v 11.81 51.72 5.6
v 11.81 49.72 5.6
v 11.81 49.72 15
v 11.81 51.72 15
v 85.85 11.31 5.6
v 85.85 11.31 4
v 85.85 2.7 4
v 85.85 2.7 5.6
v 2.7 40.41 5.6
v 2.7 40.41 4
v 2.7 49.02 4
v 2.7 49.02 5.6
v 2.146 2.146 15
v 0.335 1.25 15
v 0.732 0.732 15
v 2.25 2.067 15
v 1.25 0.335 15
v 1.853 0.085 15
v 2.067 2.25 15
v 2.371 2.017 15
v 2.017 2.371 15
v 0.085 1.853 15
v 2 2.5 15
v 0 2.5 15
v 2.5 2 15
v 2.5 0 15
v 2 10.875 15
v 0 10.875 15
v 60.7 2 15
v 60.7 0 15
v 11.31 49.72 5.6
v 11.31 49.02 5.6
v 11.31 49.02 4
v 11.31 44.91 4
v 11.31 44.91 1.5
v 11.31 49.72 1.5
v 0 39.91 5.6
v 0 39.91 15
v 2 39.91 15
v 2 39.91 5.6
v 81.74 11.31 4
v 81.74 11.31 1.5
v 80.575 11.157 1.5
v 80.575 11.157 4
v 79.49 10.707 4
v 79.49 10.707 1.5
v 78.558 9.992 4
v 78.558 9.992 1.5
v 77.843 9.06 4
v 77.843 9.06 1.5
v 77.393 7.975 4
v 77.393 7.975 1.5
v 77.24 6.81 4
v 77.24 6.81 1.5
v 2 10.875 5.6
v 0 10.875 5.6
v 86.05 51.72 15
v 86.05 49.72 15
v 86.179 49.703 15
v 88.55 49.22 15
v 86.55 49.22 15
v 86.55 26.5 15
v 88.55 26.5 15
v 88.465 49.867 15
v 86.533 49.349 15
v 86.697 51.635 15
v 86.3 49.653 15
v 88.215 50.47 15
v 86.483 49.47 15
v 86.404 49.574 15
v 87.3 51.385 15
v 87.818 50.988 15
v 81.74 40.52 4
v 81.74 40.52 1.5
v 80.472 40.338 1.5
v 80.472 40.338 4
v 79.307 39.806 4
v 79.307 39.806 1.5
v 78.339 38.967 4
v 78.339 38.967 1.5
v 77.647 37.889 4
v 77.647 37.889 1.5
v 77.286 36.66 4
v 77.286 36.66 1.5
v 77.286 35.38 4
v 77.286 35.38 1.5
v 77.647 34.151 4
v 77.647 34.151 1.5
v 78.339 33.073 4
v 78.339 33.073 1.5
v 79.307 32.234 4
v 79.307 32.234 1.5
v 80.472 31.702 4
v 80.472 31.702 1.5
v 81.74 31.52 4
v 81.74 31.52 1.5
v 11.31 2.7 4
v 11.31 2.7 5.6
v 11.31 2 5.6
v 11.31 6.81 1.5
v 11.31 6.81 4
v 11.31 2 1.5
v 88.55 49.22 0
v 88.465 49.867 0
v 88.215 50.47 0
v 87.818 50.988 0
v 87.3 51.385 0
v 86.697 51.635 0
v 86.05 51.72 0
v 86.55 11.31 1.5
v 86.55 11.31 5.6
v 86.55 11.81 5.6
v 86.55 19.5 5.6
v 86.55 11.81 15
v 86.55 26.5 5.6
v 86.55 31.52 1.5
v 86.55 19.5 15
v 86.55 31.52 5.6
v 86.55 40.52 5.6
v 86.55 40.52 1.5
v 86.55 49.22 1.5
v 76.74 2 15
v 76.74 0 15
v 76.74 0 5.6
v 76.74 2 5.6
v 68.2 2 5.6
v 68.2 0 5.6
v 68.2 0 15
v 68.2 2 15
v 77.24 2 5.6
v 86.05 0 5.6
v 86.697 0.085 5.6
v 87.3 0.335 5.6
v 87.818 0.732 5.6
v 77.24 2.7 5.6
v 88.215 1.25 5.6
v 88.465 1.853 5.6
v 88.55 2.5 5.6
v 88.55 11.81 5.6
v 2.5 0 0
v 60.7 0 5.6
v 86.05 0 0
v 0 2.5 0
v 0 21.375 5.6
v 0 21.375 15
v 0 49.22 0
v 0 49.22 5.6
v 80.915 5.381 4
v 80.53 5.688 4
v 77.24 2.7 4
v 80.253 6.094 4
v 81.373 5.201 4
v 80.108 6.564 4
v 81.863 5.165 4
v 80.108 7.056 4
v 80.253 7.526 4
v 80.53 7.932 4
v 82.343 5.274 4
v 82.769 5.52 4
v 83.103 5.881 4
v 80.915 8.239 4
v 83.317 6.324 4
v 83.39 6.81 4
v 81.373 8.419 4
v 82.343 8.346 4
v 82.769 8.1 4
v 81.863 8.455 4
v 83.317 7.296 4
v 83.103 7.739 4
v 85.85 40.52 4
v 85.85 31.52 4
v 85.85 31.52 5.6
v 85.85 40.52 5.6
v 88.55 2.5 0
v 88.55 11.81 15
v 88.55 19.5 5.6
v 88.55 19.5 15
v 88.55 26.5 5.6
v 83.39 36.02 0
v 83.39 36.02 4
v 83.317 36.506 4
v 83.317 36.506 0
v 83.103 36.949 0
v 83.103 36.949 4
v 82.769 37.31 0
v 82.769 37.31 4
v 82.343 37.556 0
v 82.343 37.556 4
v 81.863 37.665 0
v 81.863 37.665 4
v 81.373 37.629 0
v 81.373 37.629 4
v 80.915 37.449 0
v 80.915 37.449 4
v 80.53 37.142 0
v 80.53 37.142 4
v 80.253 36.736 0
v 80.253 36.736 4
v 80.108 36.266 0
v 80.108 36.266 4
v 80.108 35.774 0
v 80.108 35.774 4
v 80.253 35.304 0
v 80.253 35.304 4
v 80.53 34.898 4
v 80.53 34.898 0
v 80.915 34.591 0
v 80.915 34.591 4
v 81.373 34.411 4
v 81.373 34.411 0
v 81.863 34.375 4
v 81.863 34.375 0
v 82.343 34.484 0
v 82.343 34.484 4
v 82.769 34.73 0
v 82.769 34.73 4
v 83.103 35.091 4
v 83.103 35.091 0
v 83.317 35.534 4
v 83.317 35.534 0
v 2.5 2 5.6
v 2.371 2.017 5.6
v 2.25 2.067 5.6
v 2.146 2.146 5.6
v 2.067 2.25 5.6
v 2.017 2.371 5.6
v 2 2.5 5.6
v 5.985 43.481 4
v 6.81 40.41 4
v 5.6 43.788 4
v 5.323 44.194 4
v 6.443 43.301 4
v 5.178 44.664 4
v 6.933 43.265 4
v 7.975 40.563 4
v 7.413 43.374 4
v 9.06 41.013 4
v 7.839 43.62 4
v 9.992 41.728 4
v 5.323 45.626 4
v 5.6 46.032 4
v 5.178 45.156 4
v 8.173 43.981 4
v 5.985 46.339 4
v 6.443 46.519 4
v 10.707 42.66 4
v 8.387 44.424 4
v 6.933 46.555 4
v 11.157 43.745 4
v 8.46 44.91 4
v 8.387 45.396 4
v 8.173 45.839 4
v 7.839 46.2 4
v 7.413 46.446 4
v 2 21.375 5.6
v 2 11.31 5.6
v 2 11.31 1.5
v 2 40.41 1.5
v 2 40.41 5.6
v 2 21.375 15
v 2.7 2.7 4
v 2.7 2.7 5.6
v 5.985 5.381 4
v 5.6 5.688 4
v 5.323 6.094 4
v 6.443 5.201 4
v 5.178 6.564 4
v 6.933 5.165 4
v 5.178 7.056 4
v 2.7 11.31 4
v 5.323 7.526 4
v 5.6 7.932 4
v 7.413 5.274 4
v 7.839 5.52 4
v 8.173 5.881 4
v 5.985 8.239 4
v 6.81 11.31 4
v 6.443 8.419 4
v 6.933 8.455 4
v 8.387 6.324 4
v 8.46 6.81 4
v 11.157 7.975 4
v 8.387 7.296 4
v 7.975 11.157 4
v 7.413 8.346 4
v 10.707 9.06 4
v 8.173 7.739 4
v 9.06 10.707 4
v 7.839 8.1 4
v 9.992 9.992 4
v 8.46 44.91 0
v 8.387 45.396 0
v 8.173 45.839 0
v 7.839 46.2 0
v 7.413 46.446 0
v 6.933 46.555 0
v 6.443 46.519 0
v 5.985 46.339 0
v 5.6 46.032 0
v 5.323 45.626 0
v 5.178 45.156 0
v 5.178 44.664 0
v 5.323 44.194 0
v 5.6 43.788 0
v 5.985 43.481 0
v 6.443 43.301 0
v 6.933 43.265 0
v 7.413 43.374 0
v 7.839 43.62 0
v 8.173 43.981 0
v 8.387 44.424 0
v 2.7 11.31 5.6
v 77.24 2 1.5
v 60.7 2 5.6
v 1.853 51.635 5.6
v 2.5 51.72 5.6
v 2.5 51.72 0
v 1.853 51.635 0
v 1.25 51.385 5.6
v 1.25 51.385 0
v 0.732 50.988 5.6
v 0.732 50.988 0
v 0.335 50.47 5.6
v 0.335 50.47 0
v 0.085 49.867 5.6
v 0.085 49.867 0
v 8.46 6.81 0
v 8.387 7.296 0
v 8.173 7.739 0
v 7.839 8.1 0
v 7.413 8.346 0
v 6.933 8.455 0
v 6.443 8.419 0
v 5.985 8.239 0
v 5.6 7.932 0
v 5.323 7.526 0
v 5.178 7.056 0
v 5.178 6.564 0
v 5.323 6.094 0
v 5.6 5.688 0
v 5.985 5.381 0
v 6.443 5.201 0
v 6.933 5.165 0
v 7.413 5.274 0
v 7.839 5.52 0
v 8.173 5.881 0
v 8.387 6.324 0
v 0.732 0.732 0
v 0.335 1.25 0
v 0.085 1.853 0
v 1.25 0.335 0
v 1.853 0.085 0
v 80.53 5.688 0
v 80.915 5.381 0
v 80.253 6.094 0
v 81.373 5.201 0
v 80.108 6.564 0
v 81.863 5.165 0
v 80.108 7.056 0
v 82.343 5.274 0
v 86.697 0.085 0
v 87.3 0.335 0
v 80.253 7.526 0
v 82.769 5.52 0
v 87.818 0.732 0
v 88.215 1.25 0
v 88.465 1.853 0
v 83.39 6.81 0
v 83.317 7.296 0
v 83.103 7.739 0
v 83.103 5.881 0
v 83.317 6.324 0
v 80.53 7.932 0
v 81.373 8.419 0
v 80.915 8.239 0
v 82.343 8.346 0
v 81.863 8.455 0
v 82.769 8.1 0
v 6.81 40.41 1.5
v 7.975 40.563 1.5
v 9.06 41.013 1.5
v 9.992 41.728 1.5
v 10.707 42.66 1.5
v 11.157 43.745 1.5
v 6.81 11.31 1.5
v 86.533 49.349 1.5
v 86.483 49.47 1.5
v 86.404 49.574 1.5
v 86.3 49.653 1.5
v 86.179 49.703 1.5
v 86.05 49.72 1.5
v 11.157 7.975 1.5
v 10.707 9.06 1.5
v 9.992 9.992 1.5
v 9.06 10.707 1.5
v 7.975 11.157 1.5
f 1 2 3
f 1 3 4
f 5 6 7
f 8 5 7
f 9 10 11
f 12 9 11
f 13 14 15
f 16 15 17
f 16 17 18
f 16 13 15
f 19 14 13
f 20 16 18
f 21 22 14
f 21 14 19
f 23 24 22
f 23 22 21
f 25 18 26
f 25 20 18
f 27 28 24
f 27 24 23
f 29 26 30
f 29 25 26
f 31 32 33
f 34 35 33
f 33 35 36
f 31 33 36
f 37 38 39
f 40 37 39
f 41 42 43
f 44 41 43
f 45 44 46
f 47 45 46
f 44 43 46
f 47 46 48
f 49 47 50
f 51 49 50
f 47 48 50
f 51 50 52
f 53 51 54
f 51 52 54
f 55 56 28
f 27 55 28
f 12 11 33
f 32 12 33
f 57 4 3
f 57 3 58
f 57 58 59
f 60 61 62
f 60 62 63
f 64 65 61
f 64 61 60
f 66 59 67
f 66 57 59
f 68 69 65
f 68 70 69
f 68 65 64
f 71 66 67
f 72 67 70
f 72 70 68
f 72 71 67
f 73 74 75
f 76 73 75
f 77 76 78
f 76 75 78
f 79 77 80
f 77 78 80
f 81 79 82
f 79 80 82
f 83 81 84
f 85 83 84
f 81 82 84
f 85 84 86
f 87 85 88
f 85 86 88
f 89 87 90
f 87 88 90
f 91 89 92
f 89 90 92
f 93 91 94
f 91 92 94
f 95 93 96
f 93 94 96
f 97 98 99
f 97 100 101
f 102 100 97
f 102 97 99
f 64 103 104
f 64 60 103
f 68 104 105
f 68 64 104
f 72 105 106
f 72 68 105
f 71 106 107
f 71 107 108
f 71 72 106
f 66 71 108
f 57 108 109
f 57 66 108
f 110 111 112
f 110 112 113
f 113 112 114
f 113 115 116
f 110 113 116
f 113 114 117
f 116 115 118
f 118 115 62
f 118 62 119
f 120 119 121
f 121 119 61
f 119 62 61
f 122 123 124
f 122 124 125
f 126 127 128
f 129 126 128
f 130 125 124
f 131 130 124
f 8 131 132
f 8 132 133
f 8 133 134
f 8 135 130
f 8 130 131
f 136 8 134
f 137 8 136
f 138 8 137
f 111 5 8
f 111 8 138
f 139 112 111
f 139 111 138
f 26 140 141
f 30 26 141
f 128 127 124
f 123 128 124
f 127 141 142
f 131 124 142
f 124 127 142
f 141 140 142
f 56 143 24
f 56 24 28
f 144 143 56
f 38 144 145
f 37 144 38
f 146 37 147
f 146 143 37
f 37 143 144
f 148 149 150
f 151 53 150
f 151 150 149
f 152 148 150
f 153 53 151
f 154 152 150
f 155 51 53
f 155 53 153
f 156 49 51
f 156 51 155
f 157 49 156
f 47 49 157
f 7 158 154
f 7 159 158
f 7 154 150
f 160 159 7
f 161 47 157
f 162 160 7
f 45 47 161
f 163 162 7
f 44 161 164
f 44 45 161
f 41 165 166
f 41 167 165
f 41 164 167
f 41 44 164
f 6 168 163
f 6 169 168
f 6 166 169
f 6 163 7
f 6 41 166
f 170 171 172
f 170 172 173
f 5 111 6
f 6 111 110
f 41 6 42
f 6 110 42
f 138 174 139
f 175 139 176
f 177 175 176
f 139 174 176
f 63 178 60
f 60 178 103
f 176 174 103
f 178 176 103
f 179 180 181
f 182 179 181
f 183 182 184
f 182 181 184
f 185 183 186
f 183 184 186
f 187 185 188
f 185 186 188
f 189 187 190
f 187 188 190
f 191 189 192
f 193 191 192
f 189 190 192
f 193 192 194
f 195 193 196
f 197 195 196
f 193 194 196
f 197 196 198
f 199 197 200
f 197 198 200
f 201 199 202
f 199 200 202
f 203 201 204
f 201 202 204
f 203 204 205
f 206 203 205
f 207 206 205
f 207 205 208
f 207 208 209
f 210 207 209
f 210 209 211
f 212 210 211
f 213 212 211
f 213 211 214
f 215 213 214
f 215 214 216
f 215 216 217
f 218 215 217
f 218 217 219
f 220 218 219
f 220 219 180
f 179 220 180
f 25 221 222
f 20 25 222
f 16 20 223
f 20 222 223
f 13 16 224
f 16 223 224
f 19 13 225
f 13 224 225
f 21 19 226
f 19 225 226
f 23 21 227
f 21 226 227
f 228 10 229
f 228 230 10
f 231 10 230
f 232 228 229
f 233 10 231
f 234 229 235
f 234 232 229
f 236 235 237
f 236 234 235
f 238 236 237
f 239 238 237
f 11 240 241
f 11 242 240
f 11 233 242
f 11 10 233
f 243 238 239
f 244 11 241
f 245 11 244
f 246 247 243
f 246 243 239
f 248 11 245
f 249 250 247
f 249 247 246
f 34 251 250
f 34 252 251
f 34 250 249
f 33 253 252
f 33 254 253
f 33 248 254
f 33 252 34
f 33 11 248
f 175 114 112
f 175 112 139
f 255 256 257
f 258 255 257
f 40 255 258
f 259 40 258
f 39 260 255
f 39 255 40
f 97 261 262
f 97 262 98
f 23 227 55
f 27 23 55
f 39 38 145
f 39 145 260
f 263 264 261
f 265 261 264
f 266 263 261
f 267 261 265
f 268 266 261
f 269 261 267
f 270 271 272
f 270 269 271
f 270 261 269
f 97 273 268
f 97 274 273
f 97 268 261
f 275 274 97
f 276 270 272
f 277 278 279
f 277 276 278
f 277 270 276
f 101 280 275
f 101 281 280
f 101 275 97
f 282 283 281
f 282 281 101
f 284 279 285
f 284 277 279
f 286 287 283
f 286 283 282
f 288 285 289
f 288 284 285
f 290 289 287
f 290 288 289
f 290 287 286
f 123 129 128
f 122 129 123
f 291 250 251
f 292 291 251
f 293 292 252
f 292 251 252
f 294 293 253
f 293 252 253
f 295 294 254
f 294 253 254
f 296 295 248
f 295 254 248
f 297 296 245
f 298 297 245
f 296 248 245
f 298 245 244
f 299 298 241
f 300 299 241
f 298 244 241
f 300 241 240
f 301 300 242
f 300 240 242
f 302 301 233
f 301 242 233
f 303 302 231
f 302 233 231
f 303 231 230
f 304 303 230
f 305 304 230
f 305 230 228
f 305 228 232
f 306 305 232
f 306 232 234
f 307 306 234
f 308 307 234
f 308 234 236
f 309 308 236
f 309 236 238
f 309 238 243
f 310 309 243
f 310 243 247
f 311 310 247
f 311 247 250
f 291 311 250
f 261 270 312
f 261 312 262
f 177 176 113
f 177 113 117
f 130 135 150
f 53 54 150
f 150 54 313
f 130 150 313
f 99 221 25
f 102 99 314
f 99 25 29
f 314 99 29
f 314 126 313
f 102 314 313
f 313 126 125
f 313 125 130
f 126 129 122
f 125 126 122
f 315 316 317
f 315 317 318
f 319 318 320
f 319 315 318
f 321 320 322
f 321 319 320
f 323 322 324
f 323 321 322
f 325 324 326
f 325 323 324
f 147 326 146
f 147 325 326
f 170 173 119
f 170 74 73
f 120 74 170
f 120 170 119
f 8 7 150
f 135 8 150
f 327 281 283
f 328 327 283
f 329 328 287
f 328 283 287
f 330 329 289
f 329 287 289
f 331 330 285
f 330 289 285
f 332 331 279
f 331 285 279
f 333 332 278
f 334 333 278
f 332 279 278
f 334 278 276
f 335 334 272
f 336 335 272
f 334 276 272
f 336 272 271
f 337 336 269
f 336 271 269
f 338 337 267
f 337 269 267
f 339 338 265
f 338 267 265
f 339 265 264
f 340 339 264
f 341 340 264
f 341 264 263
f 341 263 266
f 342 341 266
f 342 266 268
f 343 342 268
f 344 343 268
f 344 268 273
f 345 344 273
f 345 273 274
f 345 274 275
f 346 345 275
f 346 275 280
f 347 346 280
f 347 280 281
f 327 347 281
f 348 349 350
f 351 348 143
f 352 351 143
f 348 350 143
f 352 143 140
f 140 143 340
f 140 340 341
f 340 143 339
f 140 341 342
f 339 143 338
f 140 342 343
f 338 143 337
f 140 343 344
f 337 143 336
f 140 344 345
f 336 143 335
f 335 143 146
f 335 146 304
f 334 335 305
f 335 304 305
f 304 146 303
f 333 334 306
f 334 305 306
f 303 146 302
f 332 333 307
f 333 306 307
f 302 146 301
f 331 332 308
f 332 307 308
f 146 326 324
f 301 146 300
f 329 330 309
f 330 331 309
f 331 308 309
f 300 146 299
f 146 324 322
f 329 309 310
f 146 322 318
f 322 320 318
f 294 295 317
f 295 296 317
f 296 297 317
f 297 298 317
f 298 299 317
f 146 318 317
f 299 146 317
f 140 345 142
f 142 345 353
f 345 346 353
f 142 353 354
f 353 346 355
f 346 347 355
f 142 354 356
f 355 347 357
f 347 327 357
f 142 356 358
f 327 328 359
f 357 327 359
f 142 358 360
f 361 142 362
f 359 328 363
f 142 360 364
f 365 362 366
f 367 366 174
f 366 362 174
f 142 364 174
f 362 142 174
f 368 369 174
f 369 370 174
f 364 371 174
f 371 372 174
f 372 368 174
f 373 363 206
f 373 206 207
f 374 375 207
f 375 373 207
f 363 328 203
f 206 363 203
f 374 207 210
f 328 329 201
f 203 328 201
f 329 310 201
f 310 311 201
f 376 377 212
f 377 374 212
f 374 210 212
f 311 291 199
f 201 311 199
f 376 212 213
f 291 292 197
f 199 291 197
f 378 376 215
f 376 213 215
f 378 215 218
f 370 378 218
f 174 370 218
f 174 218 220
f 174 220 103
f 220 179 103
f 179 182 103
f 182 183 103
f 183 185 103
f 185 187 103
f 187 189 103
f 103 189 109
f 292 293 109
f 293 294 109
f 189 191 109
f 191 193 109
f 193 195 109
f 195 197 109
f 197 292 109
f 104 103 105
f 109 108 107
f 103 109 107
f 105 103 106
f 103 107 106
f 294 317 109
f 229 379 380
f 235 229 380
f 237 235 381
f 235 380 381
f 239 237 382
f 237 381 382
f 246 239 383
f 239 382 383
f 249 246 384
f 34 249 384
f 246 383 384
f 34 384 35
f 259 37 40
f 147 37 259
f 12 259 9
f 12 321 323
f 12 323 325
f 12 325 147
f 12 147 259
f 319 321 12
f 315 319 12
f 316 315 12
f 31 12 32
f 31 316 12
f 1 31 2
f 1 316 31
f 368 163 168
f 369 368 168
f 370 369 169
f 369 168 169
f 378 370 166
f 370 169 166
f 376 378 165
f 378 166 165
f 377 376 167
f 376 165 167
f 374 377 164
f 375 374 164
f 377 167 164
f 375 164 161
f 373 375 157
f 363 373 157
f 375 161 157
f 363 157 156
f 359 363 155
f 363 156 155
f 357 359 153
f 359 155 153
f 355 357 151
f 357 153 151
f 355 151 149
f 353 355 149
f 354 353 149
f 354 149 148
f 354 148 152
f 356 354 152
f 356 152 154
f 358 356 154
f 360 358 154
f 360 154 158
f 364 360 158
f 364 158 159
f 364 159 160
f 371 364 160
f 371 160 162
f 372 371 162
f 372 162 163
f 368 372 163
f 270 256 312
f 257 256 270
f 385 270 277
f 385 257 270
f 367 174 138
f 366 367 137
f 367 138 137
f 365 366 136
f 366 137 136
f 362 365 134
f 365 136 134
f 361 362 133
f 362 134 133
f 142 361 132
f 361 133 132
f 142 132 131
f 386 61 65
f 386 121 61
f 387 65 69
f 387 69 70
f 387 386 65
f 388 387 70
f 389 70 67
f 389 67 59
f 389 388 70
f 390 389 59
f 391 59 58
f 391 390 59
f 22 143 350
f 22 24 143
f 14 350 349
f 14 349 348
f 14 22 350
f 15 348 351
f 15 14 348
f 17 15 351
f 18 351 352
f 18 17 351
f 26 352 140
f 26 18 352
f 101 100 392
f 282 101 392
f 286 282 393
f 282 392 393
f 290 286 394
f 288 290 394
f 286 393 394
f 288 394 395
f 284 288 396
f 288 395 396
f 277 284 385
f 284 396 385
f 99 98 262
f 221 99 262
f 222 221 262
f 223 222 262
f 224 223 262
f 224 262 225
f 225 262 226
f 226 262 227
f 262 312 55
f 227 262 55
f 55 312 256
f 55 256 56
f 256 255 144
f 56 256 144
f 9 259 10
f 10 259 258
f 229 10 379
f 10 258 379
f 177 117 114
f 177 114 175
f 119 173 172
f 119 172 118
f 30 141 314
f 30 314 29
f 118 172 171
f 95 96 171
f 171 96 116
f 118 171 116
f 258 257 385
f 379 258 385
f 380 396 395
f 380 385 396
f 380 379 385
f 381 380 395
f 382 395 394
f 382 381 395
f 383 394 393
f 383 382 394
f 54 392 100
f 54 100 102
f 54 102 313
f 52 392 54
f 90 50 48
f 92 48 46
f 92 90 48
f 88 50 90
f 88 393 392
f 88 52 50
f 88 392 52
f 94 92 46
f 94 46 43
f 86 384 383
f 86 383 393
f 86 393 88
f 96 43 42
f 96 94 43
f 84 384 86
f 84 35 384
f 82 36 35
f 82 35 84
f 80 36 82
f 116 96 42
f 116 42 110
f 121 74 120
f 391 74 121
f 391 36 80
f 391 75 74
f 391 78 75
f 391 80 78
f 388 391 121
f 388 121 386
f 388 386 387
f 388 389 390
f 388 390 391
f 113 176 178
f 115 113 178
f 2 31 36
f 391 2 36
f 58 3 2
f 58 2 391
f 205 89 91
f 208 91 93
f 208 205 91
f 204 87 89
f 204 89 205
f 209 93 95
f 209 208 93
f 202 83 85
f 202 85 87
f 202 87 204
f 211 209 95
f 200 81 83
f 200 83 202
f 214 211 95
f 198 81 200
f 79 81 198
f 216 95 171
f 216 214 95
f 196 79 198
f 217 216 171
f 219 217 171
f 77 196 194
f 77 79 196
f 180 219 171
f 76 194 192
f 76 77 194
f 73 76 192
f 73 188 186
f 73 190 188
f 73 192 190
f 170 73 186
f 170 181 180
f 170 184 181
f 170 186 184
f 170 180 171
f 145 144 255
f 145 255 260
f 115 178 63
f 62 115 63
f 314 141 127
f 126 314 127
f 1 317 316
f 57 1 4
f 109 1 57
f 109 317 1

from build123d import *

# Parameters (mm, degrees)
SKETCH_W        = 88.55
SKETCH_H        = 51.72
PAD_DEPTH       = 15
SKETCH001_W     = 84.55
SKETCH001_H     = 47.72
POCKET_DEPTH    = 13.5
PAD001_DEPTH    = 2.5
PAD002_DEPTH    = 2.5
PAD003_DEPTH    = 2.5
PAD004_DEPTH    = 2.5
SKETCH006_R     = 1.65
HOLE_DEPTH      = 25
SKETCH007_R     = 1.65
HOLE001_DEPTH   = 25
SKETCH008_R     = 1.65
HOLE002_DEPTH   = 25
SKETCH009_R     = 1.65
HOLE003_DEPTH   = 25
SKETCH010_W     = 7
SKETCH010_H     = 19.4
POCKET001_DEPTH = 2
SKETCH011_W     = 10.5
SKETCH011_H     = 19.4
POCKET002_DEPTH = 2
SKETCH012_W     = 7.5
SKETCH012_H     = 19.4
POCKET003_DEPTH = 2
FILLET_R        = 2.5
FILLET001_R     = 2.5
FILLET002_R     = 2.5
FILLET003_R     = 2.5
FILLET004_R     = 0.5
FILLET005_R     = 0.5
FILLET006_R     = 0.5
FILLET007_R     = 0.5
PAD005_DEPTH    = 1.6
PAD006_DEPTH    = 1.6
PAD007_DEPTH    = 1.6
SKETCH016_W     = 0.7
SKETCH016_H     = 9
PAD008_DEPTH    = 1.6
SKETCH017_W     = 11.81
SKETCH017_H     = 11.81
POCKET004_DEPTH = 9.4
SKETCH018_W     = 11.81
SKETCH018_H     = 11.81
POCKET005_DEPTH = 9.4


with BuildPart() as part:
    # Sketch → Pad (new body)
    with BuildSketch(Plane.XY):
        with Locations((44.275, 25.86)):
            Rectangle(SKETCH_W, SKETCH_H)
    extrude(amount=PAD_DEPTH)

    # Sketch001 (on Face6 of Pad) → Pocket (cut)
    with BuildSketch(Plane.XY.offset(15)):
        with Locations((44.275, 25.86)):
            Rectangle(SKETCH001_W, SKETCH001_H)
    extrude(amount=-POCKET_DEPTH, mode=Mode.SUBTRACT)

    # Sketch002 (on Face11 of Pocket) → Pad001 (join)
    with BuildSketch(Plane.XY.offset(1.5)):
        with BuildLine():
            ThreePointArc((11.31, 6.81), (9.991981, 9.991981), (6.81, 11.31))
            Line((2, 11.31), (6.81, 11.31))
            Line((2, 11.31), (2, 2))
            Line((2, 2), (11.31, 2))
            Line((11.31, 6.81), (11.31, 2))
        make_face()
    extrude(amount=PAD001_DEPTH)

    # Sketch003 (on Face11 of Pad001) → Pad002 (join)
    with BuildSketch(Plane.XY.offset(1.5)):
        with BuildLine():
            ThreePointArc((6.81, 40.41), (9.991981, 41.728019), (11.31, 44.91))
            Line((11.31, 44.91), (11.31, 49.72))
            Line((2, 49.72), (11.31, 49.72))
            Line((2, 49.72), (2, 40.41))
            Line((2, 40.41), (6.81, 40.41))
        make_face()
    extrude(amount=PAD002_DEPTH)

    # Sketch004 (on Face11 of Pad002) → Pad003 (join)
    with BuildSketch(Plane.XY.offset(1.5)):
        with BuildLine():
            ThreePointArc((81.739971, 40.52), (77.24, 36.019985), (81.74, 31.52))
            Line((81.74, 31.52), (86.55, 31.52))
            Line((86.55, 31.52), (86.55, 40.52))
            Line((81.739971, 40.52), (86.55, 40.52))
        make_face()
    extrude(amount=PAD003_DEPTH)

    # Sketch005 (on Face11 of Pad003) → Pad004 (join)
    with BuildSketch(Plane.XY.offset(1.5)):
        with BuildLine():
            ThreePointArc((81.74, 11.31), (78.558019, 9.991981), (77.24, 6.81))
            Line((77.24, 6.81), (77.24, 2))
            Line((77.24, 2), (86.55, 2))
            Line((86.55, 2), (86.55, 11.31))
            Line((81.74, 11.31), (86.55, 11.31))
        make_face()
    extrude(amount=PAD004_DEPTH)

    # Sketch006 (on Face20 of Pad004) → Hole (cut)
    with BuildSketch(Plane.XY.offset(4)):
        with Locations((6.81, 44.91)):
            Circle(SKETCH006_R)
    extrude(amount=-HOLE_DEPTH, mode=Mode.SUBTRACT)

    # Sketch007 (on Face19 of Hole) → Hole001 (cut)
    with BuildSketch(Plane.XY.offset(4)):
        with Locations((6.81, 6.81)):
            Circle(SKETCH007_R)
    extrude(amount=-HOLE001_DEPTH, mode=Mode.SUBTRACT)

    # Sketch008 (on Face15 of Hole001) → Hole002 (cut)
    with BuildSketch(Plane.XY.offset(4)):
        with Locations((81.74, 6.81)):
            Circle(SKETCH008_R)
    extrude(amount=-HOLE002_DEPTH, mode=Mode.SUBTRACT)

    # Sketch009 (on Face21 of Hole002) → Hole003 (cut)
    with BuildSketch(Plane.XY.offset(4)):
        with Locations((81.74, 36.02)):
            Circle(SKETCH009_R)
    extrude(amount=-HOLE003_DEPTH, mode=Mode.SUBTRACT)

    # Sketch010 (on Face3 of Hole003) → Pocket001 (cut)
    with BuildSketch(Plane.YZ.offset(88.55)):
        with Locations((23, 15.3)):
            Rectangle(SKETCH010_W, SKETCH010_H)
    extrude(amount=-POCKET001_DEPTH, mode=Mode.SUBTRACT)

    # Sketch011 (on Face2 of Pocket001) → Pocket002 (cut)
    with BuildSketch(Plane(origin=(0, 0, 0), x_dir=(0, -1, 0), z_dir=(-1, 0, 0))):
        with Locations((-16.125, 15.3)):
            Rectangle(SKETCH011_W, SKETCH011_H)
    extrude(amount=-POCKET002_DEPTH, mode=Mode.SUBTRACT)

    # Sketch012 (on Face1 of Pocket002) → Pocket003 (cut)
    with BuildSketch(Plane.XZ):
        with Locations((64.45, 15.3)):
            Rectangle(SKETCH012_W, SKETCH012_H)
    extrude(amount=-POCKET003_DEPTH, mode=Mode.SUBTRACT)

    # Fillet
    fillet_edges = [part.edges().sort_by_distance(p)[0] for p in [
        (88.55, 0, 7.5),
    ]]
    fillet(fillet_edges, radius=FILLET_R)

    # Fillet001
    fillet001_edges = [part.edges().sort_by_distance(p)[0] for p in [
        (88.55, 51.72, 7.5),
    ]]
    fillet(fillet001_edges, radius=FILLET001_R)

    # Fillet002
    fillet002_edges = [part.edges().sort_by_distance(p)[0] for p in [
        (0, 51.72, 7.5),
    ]]
    fillet(fillet002_edges, radius=FILLET002_R)

    # Fillet003
    fillet003_edges = [part.edges().sort_by_distance(p)[0] for p in [
        (0, 0, 7.5),
    ]]
    fillet(fillet003_edges, radius=FILLET003_R)

    # Fillet004
    fillet004_edges = [part.edges().sort_by_distance(p)[0] for p in [
        (86.55, 49.72, 8.25),
    ]]
    fillet(fillet004_edges, radius=FILLET004_R)

    # Fillet005
    fillet005_edges = [part.edges().sort_by_distance(p)[0] for p in [
        (86.55, 2, 9.5),
    ]]
    fillet(fillet005_edges, radius=FILLET005_R)

    # Fillet006
    fillet006_edges = [part.edges().sort_by_distance(p)[0] for p in [
        (2, 2, 9.5),
    ]]
    fillet(fillet006_edges, radius=FILLET006_R)

    # Fillet007
    fillet007_edges = [part.edges().sort_by_distance(p)[0] for p in [
        (2, 49.72, 9.5),
    ]]
    fillet(fillet007_edges, radius=FILLET007_R)

    # Sketch013 (on Face13 of Fillet007) → Pad005 (join)
    with BuildSketch(Plane.XY.offset(4)):
        Polygon((2.7, 11.31), (2.7, 2.7), (11.31, 2.7), (11.31, 2), (2, 2), (2, 11.31), align=None)
    extrude(amount=PAD005_DEPTH)

    # Sketch014 (on Face9 of Pad005) → Pad006 (join)
    with BuildSketch(Plane.XY.offset(4)):
        Polygon((2.7, 40.41), (2.7, 49.02), (11.31, 49.02), (11.31, 49.72), (2, 49.72), (2, 40.41), align=None)
    extrude(amount=PAD006_DEPTH)

    # Sketch015 (on Face43 of Pad006) → Pad007 (join)
    with BuildSketch(Plane.XY.offset(4)):
        Polygon((85.85, 11.31), (85.85, 2.7), (77.24, 2.7), (77.24, 2), (86.55, 2), (86.55, 11.31), align=None)
    extrude(amount=PAD007_DEPTH)

    # Sketch016 (on Face43 of Pad007) → Pad008 (join)
    with BuildSketch(Plane.XY.offset(4)):
        with Locations((86.2, 36.02)):
            Rectangle(SKETCH016_W, SKETCH016_H)
    extrude(amount=PAD008_DEPTH)

    # Sketch017 (on Face2 of Pad008) → Pocket004 (cut)
    with BuildSketch(Plane.XY.offset(15)):
        with Locations((5.905, 45.815)):
            Rectangle(SKETCH017_W, SKETCH017_H)
    extrude(amount=-POCKET004_DEPTH, mode=Mode.SUBTRACT)

    # Sketch018 (on Face46 of Pocket004) → Pocket005 (cut)
    with BuildSketch(Plane.XY.offset(15)):
        with Locations((82.645, 5.905)):
            Rectangle(SKETCH018_W, SKETCH018_H)
    extrude(amount=-POCKET005_DEPTH, mode=Mode.SUBTRACT)


solid = part.part
